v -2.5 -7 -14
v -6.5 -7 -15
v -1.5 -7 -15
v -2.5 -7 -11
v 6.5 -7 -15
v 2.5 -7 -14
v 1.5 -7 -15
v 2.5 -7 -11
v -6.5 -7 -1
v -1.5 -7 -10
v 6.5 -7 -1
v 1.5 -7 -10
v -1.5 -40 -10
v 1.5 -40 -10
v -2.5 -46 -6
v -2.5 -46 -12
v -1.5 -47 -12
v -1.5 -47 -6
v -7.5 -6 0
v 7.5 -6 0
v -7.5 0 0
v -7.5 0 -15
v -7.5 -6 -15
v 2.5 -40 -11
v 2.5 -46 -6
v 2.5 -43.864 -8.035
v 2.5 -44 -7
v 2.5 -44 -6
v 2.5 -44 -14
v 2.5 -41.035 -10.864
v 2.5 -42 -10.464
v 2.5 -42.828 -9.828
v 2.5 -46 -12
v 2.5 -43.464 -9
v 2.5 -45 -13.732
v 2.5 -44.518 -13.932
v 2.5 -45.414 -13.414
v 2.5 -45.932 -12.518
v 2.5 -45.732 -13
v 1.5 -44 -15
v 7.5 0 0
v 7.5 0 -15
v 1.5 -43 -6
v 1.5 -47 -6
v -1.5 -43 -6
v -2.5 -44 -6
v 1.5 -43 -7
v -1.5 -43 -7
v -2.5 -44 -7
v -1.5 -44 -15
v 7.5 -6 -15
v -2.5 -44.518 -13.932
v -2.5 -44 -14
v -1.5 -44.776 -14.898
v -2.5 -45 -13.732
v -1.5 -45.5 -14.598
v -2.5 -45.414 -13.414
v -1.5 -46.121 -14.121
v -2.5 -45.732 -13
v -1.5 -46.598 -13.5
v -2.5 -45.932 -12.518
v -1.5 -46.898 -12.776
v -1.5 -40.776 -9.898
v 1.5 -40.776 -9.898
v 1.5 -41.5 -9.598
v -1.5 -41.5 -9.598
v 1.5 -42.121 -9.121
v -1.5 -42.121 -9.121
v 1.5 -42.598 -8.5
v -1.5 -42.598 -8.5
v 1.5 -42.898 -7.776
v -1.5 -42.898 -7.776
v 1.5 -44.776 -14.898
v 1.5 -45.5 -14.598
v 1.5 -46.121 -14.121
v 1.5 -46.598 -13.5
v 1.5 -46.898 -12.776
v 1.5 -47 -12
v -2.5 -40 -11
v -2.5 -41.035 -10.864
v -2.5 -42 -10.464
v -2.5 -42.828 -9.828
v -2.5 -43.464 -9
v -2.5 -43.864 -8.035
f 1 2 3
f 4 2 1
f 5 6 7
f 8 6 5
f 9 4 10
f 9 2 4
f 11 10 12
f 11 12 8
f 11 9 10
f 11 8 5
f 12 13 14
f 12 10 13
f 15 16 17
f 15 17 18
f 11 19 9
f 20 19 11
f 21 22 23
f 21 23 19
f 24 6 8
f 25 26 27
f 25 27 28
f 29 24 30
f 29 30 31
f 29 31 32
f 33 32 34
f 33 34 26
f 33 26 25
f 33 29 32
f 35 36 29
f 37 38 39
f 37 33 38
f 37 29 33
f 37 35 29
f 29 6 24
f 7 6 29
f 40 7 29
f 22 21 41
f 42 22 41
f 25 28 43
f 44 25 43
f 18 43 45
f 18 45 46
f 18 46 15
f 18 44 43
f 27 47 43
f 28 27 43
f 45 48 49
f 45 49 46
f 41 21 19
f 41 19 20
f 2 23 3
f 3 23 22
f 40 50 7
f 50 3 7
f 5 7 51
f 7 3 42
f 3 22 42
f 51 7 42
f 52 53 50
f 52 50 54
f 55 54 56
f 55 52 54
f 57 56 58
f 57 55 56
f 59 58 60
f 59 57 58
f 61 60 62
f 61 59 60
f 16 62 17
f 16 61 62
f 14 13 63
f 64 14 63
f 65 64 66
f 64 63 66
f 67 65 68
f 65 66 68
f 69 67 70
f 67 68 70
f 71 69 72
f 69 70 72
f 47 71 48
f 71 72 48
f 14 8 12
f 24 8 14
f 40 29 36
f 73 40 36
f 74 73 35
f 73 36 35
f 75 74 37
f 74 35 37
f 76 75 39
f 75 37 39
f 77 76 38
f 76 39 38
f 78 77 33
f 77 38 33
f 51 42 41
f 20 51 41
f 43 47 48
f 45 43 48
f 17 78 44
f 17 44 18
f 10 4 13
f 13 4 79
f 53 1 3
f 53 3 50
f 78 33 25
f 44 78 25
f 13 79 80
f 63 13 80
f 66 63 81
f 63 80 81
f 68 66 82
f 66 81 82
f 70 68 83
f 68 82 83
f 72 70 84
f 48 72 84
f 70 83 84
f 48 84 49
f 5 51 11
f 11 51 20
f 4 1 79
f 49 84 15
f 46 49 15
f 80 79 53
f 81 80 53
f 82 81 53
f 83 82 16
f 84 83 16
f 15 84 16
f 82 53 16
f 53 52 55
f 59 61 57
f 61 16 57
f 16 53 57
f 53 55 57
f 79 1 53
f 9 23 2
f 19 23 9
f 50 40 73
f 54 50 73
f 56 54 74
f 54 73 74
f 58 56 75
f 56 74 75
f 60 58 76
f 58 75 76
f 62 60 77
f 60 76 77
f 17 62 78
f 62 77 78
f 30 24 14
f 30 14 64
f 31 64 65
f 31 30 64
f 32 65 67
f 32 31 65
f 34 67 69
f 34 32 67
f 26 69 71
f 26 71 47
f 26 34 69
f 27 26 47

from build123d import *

# Parameters (mm, degrees)
SKETCH_W        = 15
SKETCH_H        = 15
PAD_DEPTH       = 7
SKETCH001_W     = 5
SKETCH001_H     = 5
PAD001_DEPTH    = 40
SKETCH002_W     = 5
SKETCH002_H     = 4
PAD002_DEPTH    = 4
CHAMFER_SIZE    = 1
FILLET_R        = 3
CHAMFER001_SIZE = 1
CHAMFER002_SIZE = 1


with BuildPart() as part:
    # Sketch → Pad (new body)
    with BuildSketch(Plane.XZ):
        with Locations((0, -7.5)):
            Rectangle(SKETCH_W, SKETCH_H)
    extrude(amount=PAD_DEPTH)

    # Sketch001 (on Face6 of Pad) → Pad001 (join)
    with BuildSketch(Plane.XZ.offset(7)):
        with Locations((0, -12.5)):
            Rectangle(SKETCH001_W, SKETCH001_H)
    extrude(amount=PAD001_DEPTH)

    # Sketch002 (on Face7 of Pad001) → Pad002 (join)
    with BuildSketch(Plane(origin=(0, 0, -10), x_dir=(-1, 0, 0), z_dir=(0, 0, 1))):
        with Locations((0, 45)):
            Rectangle(SKETCH002_W, SKETCH002_H)
    extrude(amount=PAD002_DEPTH)

    # Chamfer
    chamfer_edges = [part.edges().sort_by_distance(p)[0] for p in [
        (0, -7, 0),
        (-7.5, -7, -7.5),
        (7.5, -7, -7.5),
    ]]
    chamfer(chamfer_edges, length=CHAMFER_SIZE)

    # Fillet
    fillet_edges = [part.edges().sort_by_distance(p)[0] for p in [
        (0, -43, -10),
        (0, -47, -15),
    ]]
    fillet(fillet_edges, radius=FILLET_R)

    # Chamfer001
    chamfer001_edges = [part.edges().sort_by_distance(p)[0] for p in [
        (2.5, -25.5, -15),
        (-2.5, -25.5, -15),
    ]]
    chamfer(chamfer001_edges, length=CHAMFER001_SIZE)

    # Chamfer002
    chamfer002_edges = [part.edges().sort_by_distance(p)[0] for p in [
        (2.5, -23.5, -10),
        (-2.5, -23.5, -10),
    ]]
    chamfer(chamfer002_edges, length=CHAMFER002_SIZE)


solid = part.part
